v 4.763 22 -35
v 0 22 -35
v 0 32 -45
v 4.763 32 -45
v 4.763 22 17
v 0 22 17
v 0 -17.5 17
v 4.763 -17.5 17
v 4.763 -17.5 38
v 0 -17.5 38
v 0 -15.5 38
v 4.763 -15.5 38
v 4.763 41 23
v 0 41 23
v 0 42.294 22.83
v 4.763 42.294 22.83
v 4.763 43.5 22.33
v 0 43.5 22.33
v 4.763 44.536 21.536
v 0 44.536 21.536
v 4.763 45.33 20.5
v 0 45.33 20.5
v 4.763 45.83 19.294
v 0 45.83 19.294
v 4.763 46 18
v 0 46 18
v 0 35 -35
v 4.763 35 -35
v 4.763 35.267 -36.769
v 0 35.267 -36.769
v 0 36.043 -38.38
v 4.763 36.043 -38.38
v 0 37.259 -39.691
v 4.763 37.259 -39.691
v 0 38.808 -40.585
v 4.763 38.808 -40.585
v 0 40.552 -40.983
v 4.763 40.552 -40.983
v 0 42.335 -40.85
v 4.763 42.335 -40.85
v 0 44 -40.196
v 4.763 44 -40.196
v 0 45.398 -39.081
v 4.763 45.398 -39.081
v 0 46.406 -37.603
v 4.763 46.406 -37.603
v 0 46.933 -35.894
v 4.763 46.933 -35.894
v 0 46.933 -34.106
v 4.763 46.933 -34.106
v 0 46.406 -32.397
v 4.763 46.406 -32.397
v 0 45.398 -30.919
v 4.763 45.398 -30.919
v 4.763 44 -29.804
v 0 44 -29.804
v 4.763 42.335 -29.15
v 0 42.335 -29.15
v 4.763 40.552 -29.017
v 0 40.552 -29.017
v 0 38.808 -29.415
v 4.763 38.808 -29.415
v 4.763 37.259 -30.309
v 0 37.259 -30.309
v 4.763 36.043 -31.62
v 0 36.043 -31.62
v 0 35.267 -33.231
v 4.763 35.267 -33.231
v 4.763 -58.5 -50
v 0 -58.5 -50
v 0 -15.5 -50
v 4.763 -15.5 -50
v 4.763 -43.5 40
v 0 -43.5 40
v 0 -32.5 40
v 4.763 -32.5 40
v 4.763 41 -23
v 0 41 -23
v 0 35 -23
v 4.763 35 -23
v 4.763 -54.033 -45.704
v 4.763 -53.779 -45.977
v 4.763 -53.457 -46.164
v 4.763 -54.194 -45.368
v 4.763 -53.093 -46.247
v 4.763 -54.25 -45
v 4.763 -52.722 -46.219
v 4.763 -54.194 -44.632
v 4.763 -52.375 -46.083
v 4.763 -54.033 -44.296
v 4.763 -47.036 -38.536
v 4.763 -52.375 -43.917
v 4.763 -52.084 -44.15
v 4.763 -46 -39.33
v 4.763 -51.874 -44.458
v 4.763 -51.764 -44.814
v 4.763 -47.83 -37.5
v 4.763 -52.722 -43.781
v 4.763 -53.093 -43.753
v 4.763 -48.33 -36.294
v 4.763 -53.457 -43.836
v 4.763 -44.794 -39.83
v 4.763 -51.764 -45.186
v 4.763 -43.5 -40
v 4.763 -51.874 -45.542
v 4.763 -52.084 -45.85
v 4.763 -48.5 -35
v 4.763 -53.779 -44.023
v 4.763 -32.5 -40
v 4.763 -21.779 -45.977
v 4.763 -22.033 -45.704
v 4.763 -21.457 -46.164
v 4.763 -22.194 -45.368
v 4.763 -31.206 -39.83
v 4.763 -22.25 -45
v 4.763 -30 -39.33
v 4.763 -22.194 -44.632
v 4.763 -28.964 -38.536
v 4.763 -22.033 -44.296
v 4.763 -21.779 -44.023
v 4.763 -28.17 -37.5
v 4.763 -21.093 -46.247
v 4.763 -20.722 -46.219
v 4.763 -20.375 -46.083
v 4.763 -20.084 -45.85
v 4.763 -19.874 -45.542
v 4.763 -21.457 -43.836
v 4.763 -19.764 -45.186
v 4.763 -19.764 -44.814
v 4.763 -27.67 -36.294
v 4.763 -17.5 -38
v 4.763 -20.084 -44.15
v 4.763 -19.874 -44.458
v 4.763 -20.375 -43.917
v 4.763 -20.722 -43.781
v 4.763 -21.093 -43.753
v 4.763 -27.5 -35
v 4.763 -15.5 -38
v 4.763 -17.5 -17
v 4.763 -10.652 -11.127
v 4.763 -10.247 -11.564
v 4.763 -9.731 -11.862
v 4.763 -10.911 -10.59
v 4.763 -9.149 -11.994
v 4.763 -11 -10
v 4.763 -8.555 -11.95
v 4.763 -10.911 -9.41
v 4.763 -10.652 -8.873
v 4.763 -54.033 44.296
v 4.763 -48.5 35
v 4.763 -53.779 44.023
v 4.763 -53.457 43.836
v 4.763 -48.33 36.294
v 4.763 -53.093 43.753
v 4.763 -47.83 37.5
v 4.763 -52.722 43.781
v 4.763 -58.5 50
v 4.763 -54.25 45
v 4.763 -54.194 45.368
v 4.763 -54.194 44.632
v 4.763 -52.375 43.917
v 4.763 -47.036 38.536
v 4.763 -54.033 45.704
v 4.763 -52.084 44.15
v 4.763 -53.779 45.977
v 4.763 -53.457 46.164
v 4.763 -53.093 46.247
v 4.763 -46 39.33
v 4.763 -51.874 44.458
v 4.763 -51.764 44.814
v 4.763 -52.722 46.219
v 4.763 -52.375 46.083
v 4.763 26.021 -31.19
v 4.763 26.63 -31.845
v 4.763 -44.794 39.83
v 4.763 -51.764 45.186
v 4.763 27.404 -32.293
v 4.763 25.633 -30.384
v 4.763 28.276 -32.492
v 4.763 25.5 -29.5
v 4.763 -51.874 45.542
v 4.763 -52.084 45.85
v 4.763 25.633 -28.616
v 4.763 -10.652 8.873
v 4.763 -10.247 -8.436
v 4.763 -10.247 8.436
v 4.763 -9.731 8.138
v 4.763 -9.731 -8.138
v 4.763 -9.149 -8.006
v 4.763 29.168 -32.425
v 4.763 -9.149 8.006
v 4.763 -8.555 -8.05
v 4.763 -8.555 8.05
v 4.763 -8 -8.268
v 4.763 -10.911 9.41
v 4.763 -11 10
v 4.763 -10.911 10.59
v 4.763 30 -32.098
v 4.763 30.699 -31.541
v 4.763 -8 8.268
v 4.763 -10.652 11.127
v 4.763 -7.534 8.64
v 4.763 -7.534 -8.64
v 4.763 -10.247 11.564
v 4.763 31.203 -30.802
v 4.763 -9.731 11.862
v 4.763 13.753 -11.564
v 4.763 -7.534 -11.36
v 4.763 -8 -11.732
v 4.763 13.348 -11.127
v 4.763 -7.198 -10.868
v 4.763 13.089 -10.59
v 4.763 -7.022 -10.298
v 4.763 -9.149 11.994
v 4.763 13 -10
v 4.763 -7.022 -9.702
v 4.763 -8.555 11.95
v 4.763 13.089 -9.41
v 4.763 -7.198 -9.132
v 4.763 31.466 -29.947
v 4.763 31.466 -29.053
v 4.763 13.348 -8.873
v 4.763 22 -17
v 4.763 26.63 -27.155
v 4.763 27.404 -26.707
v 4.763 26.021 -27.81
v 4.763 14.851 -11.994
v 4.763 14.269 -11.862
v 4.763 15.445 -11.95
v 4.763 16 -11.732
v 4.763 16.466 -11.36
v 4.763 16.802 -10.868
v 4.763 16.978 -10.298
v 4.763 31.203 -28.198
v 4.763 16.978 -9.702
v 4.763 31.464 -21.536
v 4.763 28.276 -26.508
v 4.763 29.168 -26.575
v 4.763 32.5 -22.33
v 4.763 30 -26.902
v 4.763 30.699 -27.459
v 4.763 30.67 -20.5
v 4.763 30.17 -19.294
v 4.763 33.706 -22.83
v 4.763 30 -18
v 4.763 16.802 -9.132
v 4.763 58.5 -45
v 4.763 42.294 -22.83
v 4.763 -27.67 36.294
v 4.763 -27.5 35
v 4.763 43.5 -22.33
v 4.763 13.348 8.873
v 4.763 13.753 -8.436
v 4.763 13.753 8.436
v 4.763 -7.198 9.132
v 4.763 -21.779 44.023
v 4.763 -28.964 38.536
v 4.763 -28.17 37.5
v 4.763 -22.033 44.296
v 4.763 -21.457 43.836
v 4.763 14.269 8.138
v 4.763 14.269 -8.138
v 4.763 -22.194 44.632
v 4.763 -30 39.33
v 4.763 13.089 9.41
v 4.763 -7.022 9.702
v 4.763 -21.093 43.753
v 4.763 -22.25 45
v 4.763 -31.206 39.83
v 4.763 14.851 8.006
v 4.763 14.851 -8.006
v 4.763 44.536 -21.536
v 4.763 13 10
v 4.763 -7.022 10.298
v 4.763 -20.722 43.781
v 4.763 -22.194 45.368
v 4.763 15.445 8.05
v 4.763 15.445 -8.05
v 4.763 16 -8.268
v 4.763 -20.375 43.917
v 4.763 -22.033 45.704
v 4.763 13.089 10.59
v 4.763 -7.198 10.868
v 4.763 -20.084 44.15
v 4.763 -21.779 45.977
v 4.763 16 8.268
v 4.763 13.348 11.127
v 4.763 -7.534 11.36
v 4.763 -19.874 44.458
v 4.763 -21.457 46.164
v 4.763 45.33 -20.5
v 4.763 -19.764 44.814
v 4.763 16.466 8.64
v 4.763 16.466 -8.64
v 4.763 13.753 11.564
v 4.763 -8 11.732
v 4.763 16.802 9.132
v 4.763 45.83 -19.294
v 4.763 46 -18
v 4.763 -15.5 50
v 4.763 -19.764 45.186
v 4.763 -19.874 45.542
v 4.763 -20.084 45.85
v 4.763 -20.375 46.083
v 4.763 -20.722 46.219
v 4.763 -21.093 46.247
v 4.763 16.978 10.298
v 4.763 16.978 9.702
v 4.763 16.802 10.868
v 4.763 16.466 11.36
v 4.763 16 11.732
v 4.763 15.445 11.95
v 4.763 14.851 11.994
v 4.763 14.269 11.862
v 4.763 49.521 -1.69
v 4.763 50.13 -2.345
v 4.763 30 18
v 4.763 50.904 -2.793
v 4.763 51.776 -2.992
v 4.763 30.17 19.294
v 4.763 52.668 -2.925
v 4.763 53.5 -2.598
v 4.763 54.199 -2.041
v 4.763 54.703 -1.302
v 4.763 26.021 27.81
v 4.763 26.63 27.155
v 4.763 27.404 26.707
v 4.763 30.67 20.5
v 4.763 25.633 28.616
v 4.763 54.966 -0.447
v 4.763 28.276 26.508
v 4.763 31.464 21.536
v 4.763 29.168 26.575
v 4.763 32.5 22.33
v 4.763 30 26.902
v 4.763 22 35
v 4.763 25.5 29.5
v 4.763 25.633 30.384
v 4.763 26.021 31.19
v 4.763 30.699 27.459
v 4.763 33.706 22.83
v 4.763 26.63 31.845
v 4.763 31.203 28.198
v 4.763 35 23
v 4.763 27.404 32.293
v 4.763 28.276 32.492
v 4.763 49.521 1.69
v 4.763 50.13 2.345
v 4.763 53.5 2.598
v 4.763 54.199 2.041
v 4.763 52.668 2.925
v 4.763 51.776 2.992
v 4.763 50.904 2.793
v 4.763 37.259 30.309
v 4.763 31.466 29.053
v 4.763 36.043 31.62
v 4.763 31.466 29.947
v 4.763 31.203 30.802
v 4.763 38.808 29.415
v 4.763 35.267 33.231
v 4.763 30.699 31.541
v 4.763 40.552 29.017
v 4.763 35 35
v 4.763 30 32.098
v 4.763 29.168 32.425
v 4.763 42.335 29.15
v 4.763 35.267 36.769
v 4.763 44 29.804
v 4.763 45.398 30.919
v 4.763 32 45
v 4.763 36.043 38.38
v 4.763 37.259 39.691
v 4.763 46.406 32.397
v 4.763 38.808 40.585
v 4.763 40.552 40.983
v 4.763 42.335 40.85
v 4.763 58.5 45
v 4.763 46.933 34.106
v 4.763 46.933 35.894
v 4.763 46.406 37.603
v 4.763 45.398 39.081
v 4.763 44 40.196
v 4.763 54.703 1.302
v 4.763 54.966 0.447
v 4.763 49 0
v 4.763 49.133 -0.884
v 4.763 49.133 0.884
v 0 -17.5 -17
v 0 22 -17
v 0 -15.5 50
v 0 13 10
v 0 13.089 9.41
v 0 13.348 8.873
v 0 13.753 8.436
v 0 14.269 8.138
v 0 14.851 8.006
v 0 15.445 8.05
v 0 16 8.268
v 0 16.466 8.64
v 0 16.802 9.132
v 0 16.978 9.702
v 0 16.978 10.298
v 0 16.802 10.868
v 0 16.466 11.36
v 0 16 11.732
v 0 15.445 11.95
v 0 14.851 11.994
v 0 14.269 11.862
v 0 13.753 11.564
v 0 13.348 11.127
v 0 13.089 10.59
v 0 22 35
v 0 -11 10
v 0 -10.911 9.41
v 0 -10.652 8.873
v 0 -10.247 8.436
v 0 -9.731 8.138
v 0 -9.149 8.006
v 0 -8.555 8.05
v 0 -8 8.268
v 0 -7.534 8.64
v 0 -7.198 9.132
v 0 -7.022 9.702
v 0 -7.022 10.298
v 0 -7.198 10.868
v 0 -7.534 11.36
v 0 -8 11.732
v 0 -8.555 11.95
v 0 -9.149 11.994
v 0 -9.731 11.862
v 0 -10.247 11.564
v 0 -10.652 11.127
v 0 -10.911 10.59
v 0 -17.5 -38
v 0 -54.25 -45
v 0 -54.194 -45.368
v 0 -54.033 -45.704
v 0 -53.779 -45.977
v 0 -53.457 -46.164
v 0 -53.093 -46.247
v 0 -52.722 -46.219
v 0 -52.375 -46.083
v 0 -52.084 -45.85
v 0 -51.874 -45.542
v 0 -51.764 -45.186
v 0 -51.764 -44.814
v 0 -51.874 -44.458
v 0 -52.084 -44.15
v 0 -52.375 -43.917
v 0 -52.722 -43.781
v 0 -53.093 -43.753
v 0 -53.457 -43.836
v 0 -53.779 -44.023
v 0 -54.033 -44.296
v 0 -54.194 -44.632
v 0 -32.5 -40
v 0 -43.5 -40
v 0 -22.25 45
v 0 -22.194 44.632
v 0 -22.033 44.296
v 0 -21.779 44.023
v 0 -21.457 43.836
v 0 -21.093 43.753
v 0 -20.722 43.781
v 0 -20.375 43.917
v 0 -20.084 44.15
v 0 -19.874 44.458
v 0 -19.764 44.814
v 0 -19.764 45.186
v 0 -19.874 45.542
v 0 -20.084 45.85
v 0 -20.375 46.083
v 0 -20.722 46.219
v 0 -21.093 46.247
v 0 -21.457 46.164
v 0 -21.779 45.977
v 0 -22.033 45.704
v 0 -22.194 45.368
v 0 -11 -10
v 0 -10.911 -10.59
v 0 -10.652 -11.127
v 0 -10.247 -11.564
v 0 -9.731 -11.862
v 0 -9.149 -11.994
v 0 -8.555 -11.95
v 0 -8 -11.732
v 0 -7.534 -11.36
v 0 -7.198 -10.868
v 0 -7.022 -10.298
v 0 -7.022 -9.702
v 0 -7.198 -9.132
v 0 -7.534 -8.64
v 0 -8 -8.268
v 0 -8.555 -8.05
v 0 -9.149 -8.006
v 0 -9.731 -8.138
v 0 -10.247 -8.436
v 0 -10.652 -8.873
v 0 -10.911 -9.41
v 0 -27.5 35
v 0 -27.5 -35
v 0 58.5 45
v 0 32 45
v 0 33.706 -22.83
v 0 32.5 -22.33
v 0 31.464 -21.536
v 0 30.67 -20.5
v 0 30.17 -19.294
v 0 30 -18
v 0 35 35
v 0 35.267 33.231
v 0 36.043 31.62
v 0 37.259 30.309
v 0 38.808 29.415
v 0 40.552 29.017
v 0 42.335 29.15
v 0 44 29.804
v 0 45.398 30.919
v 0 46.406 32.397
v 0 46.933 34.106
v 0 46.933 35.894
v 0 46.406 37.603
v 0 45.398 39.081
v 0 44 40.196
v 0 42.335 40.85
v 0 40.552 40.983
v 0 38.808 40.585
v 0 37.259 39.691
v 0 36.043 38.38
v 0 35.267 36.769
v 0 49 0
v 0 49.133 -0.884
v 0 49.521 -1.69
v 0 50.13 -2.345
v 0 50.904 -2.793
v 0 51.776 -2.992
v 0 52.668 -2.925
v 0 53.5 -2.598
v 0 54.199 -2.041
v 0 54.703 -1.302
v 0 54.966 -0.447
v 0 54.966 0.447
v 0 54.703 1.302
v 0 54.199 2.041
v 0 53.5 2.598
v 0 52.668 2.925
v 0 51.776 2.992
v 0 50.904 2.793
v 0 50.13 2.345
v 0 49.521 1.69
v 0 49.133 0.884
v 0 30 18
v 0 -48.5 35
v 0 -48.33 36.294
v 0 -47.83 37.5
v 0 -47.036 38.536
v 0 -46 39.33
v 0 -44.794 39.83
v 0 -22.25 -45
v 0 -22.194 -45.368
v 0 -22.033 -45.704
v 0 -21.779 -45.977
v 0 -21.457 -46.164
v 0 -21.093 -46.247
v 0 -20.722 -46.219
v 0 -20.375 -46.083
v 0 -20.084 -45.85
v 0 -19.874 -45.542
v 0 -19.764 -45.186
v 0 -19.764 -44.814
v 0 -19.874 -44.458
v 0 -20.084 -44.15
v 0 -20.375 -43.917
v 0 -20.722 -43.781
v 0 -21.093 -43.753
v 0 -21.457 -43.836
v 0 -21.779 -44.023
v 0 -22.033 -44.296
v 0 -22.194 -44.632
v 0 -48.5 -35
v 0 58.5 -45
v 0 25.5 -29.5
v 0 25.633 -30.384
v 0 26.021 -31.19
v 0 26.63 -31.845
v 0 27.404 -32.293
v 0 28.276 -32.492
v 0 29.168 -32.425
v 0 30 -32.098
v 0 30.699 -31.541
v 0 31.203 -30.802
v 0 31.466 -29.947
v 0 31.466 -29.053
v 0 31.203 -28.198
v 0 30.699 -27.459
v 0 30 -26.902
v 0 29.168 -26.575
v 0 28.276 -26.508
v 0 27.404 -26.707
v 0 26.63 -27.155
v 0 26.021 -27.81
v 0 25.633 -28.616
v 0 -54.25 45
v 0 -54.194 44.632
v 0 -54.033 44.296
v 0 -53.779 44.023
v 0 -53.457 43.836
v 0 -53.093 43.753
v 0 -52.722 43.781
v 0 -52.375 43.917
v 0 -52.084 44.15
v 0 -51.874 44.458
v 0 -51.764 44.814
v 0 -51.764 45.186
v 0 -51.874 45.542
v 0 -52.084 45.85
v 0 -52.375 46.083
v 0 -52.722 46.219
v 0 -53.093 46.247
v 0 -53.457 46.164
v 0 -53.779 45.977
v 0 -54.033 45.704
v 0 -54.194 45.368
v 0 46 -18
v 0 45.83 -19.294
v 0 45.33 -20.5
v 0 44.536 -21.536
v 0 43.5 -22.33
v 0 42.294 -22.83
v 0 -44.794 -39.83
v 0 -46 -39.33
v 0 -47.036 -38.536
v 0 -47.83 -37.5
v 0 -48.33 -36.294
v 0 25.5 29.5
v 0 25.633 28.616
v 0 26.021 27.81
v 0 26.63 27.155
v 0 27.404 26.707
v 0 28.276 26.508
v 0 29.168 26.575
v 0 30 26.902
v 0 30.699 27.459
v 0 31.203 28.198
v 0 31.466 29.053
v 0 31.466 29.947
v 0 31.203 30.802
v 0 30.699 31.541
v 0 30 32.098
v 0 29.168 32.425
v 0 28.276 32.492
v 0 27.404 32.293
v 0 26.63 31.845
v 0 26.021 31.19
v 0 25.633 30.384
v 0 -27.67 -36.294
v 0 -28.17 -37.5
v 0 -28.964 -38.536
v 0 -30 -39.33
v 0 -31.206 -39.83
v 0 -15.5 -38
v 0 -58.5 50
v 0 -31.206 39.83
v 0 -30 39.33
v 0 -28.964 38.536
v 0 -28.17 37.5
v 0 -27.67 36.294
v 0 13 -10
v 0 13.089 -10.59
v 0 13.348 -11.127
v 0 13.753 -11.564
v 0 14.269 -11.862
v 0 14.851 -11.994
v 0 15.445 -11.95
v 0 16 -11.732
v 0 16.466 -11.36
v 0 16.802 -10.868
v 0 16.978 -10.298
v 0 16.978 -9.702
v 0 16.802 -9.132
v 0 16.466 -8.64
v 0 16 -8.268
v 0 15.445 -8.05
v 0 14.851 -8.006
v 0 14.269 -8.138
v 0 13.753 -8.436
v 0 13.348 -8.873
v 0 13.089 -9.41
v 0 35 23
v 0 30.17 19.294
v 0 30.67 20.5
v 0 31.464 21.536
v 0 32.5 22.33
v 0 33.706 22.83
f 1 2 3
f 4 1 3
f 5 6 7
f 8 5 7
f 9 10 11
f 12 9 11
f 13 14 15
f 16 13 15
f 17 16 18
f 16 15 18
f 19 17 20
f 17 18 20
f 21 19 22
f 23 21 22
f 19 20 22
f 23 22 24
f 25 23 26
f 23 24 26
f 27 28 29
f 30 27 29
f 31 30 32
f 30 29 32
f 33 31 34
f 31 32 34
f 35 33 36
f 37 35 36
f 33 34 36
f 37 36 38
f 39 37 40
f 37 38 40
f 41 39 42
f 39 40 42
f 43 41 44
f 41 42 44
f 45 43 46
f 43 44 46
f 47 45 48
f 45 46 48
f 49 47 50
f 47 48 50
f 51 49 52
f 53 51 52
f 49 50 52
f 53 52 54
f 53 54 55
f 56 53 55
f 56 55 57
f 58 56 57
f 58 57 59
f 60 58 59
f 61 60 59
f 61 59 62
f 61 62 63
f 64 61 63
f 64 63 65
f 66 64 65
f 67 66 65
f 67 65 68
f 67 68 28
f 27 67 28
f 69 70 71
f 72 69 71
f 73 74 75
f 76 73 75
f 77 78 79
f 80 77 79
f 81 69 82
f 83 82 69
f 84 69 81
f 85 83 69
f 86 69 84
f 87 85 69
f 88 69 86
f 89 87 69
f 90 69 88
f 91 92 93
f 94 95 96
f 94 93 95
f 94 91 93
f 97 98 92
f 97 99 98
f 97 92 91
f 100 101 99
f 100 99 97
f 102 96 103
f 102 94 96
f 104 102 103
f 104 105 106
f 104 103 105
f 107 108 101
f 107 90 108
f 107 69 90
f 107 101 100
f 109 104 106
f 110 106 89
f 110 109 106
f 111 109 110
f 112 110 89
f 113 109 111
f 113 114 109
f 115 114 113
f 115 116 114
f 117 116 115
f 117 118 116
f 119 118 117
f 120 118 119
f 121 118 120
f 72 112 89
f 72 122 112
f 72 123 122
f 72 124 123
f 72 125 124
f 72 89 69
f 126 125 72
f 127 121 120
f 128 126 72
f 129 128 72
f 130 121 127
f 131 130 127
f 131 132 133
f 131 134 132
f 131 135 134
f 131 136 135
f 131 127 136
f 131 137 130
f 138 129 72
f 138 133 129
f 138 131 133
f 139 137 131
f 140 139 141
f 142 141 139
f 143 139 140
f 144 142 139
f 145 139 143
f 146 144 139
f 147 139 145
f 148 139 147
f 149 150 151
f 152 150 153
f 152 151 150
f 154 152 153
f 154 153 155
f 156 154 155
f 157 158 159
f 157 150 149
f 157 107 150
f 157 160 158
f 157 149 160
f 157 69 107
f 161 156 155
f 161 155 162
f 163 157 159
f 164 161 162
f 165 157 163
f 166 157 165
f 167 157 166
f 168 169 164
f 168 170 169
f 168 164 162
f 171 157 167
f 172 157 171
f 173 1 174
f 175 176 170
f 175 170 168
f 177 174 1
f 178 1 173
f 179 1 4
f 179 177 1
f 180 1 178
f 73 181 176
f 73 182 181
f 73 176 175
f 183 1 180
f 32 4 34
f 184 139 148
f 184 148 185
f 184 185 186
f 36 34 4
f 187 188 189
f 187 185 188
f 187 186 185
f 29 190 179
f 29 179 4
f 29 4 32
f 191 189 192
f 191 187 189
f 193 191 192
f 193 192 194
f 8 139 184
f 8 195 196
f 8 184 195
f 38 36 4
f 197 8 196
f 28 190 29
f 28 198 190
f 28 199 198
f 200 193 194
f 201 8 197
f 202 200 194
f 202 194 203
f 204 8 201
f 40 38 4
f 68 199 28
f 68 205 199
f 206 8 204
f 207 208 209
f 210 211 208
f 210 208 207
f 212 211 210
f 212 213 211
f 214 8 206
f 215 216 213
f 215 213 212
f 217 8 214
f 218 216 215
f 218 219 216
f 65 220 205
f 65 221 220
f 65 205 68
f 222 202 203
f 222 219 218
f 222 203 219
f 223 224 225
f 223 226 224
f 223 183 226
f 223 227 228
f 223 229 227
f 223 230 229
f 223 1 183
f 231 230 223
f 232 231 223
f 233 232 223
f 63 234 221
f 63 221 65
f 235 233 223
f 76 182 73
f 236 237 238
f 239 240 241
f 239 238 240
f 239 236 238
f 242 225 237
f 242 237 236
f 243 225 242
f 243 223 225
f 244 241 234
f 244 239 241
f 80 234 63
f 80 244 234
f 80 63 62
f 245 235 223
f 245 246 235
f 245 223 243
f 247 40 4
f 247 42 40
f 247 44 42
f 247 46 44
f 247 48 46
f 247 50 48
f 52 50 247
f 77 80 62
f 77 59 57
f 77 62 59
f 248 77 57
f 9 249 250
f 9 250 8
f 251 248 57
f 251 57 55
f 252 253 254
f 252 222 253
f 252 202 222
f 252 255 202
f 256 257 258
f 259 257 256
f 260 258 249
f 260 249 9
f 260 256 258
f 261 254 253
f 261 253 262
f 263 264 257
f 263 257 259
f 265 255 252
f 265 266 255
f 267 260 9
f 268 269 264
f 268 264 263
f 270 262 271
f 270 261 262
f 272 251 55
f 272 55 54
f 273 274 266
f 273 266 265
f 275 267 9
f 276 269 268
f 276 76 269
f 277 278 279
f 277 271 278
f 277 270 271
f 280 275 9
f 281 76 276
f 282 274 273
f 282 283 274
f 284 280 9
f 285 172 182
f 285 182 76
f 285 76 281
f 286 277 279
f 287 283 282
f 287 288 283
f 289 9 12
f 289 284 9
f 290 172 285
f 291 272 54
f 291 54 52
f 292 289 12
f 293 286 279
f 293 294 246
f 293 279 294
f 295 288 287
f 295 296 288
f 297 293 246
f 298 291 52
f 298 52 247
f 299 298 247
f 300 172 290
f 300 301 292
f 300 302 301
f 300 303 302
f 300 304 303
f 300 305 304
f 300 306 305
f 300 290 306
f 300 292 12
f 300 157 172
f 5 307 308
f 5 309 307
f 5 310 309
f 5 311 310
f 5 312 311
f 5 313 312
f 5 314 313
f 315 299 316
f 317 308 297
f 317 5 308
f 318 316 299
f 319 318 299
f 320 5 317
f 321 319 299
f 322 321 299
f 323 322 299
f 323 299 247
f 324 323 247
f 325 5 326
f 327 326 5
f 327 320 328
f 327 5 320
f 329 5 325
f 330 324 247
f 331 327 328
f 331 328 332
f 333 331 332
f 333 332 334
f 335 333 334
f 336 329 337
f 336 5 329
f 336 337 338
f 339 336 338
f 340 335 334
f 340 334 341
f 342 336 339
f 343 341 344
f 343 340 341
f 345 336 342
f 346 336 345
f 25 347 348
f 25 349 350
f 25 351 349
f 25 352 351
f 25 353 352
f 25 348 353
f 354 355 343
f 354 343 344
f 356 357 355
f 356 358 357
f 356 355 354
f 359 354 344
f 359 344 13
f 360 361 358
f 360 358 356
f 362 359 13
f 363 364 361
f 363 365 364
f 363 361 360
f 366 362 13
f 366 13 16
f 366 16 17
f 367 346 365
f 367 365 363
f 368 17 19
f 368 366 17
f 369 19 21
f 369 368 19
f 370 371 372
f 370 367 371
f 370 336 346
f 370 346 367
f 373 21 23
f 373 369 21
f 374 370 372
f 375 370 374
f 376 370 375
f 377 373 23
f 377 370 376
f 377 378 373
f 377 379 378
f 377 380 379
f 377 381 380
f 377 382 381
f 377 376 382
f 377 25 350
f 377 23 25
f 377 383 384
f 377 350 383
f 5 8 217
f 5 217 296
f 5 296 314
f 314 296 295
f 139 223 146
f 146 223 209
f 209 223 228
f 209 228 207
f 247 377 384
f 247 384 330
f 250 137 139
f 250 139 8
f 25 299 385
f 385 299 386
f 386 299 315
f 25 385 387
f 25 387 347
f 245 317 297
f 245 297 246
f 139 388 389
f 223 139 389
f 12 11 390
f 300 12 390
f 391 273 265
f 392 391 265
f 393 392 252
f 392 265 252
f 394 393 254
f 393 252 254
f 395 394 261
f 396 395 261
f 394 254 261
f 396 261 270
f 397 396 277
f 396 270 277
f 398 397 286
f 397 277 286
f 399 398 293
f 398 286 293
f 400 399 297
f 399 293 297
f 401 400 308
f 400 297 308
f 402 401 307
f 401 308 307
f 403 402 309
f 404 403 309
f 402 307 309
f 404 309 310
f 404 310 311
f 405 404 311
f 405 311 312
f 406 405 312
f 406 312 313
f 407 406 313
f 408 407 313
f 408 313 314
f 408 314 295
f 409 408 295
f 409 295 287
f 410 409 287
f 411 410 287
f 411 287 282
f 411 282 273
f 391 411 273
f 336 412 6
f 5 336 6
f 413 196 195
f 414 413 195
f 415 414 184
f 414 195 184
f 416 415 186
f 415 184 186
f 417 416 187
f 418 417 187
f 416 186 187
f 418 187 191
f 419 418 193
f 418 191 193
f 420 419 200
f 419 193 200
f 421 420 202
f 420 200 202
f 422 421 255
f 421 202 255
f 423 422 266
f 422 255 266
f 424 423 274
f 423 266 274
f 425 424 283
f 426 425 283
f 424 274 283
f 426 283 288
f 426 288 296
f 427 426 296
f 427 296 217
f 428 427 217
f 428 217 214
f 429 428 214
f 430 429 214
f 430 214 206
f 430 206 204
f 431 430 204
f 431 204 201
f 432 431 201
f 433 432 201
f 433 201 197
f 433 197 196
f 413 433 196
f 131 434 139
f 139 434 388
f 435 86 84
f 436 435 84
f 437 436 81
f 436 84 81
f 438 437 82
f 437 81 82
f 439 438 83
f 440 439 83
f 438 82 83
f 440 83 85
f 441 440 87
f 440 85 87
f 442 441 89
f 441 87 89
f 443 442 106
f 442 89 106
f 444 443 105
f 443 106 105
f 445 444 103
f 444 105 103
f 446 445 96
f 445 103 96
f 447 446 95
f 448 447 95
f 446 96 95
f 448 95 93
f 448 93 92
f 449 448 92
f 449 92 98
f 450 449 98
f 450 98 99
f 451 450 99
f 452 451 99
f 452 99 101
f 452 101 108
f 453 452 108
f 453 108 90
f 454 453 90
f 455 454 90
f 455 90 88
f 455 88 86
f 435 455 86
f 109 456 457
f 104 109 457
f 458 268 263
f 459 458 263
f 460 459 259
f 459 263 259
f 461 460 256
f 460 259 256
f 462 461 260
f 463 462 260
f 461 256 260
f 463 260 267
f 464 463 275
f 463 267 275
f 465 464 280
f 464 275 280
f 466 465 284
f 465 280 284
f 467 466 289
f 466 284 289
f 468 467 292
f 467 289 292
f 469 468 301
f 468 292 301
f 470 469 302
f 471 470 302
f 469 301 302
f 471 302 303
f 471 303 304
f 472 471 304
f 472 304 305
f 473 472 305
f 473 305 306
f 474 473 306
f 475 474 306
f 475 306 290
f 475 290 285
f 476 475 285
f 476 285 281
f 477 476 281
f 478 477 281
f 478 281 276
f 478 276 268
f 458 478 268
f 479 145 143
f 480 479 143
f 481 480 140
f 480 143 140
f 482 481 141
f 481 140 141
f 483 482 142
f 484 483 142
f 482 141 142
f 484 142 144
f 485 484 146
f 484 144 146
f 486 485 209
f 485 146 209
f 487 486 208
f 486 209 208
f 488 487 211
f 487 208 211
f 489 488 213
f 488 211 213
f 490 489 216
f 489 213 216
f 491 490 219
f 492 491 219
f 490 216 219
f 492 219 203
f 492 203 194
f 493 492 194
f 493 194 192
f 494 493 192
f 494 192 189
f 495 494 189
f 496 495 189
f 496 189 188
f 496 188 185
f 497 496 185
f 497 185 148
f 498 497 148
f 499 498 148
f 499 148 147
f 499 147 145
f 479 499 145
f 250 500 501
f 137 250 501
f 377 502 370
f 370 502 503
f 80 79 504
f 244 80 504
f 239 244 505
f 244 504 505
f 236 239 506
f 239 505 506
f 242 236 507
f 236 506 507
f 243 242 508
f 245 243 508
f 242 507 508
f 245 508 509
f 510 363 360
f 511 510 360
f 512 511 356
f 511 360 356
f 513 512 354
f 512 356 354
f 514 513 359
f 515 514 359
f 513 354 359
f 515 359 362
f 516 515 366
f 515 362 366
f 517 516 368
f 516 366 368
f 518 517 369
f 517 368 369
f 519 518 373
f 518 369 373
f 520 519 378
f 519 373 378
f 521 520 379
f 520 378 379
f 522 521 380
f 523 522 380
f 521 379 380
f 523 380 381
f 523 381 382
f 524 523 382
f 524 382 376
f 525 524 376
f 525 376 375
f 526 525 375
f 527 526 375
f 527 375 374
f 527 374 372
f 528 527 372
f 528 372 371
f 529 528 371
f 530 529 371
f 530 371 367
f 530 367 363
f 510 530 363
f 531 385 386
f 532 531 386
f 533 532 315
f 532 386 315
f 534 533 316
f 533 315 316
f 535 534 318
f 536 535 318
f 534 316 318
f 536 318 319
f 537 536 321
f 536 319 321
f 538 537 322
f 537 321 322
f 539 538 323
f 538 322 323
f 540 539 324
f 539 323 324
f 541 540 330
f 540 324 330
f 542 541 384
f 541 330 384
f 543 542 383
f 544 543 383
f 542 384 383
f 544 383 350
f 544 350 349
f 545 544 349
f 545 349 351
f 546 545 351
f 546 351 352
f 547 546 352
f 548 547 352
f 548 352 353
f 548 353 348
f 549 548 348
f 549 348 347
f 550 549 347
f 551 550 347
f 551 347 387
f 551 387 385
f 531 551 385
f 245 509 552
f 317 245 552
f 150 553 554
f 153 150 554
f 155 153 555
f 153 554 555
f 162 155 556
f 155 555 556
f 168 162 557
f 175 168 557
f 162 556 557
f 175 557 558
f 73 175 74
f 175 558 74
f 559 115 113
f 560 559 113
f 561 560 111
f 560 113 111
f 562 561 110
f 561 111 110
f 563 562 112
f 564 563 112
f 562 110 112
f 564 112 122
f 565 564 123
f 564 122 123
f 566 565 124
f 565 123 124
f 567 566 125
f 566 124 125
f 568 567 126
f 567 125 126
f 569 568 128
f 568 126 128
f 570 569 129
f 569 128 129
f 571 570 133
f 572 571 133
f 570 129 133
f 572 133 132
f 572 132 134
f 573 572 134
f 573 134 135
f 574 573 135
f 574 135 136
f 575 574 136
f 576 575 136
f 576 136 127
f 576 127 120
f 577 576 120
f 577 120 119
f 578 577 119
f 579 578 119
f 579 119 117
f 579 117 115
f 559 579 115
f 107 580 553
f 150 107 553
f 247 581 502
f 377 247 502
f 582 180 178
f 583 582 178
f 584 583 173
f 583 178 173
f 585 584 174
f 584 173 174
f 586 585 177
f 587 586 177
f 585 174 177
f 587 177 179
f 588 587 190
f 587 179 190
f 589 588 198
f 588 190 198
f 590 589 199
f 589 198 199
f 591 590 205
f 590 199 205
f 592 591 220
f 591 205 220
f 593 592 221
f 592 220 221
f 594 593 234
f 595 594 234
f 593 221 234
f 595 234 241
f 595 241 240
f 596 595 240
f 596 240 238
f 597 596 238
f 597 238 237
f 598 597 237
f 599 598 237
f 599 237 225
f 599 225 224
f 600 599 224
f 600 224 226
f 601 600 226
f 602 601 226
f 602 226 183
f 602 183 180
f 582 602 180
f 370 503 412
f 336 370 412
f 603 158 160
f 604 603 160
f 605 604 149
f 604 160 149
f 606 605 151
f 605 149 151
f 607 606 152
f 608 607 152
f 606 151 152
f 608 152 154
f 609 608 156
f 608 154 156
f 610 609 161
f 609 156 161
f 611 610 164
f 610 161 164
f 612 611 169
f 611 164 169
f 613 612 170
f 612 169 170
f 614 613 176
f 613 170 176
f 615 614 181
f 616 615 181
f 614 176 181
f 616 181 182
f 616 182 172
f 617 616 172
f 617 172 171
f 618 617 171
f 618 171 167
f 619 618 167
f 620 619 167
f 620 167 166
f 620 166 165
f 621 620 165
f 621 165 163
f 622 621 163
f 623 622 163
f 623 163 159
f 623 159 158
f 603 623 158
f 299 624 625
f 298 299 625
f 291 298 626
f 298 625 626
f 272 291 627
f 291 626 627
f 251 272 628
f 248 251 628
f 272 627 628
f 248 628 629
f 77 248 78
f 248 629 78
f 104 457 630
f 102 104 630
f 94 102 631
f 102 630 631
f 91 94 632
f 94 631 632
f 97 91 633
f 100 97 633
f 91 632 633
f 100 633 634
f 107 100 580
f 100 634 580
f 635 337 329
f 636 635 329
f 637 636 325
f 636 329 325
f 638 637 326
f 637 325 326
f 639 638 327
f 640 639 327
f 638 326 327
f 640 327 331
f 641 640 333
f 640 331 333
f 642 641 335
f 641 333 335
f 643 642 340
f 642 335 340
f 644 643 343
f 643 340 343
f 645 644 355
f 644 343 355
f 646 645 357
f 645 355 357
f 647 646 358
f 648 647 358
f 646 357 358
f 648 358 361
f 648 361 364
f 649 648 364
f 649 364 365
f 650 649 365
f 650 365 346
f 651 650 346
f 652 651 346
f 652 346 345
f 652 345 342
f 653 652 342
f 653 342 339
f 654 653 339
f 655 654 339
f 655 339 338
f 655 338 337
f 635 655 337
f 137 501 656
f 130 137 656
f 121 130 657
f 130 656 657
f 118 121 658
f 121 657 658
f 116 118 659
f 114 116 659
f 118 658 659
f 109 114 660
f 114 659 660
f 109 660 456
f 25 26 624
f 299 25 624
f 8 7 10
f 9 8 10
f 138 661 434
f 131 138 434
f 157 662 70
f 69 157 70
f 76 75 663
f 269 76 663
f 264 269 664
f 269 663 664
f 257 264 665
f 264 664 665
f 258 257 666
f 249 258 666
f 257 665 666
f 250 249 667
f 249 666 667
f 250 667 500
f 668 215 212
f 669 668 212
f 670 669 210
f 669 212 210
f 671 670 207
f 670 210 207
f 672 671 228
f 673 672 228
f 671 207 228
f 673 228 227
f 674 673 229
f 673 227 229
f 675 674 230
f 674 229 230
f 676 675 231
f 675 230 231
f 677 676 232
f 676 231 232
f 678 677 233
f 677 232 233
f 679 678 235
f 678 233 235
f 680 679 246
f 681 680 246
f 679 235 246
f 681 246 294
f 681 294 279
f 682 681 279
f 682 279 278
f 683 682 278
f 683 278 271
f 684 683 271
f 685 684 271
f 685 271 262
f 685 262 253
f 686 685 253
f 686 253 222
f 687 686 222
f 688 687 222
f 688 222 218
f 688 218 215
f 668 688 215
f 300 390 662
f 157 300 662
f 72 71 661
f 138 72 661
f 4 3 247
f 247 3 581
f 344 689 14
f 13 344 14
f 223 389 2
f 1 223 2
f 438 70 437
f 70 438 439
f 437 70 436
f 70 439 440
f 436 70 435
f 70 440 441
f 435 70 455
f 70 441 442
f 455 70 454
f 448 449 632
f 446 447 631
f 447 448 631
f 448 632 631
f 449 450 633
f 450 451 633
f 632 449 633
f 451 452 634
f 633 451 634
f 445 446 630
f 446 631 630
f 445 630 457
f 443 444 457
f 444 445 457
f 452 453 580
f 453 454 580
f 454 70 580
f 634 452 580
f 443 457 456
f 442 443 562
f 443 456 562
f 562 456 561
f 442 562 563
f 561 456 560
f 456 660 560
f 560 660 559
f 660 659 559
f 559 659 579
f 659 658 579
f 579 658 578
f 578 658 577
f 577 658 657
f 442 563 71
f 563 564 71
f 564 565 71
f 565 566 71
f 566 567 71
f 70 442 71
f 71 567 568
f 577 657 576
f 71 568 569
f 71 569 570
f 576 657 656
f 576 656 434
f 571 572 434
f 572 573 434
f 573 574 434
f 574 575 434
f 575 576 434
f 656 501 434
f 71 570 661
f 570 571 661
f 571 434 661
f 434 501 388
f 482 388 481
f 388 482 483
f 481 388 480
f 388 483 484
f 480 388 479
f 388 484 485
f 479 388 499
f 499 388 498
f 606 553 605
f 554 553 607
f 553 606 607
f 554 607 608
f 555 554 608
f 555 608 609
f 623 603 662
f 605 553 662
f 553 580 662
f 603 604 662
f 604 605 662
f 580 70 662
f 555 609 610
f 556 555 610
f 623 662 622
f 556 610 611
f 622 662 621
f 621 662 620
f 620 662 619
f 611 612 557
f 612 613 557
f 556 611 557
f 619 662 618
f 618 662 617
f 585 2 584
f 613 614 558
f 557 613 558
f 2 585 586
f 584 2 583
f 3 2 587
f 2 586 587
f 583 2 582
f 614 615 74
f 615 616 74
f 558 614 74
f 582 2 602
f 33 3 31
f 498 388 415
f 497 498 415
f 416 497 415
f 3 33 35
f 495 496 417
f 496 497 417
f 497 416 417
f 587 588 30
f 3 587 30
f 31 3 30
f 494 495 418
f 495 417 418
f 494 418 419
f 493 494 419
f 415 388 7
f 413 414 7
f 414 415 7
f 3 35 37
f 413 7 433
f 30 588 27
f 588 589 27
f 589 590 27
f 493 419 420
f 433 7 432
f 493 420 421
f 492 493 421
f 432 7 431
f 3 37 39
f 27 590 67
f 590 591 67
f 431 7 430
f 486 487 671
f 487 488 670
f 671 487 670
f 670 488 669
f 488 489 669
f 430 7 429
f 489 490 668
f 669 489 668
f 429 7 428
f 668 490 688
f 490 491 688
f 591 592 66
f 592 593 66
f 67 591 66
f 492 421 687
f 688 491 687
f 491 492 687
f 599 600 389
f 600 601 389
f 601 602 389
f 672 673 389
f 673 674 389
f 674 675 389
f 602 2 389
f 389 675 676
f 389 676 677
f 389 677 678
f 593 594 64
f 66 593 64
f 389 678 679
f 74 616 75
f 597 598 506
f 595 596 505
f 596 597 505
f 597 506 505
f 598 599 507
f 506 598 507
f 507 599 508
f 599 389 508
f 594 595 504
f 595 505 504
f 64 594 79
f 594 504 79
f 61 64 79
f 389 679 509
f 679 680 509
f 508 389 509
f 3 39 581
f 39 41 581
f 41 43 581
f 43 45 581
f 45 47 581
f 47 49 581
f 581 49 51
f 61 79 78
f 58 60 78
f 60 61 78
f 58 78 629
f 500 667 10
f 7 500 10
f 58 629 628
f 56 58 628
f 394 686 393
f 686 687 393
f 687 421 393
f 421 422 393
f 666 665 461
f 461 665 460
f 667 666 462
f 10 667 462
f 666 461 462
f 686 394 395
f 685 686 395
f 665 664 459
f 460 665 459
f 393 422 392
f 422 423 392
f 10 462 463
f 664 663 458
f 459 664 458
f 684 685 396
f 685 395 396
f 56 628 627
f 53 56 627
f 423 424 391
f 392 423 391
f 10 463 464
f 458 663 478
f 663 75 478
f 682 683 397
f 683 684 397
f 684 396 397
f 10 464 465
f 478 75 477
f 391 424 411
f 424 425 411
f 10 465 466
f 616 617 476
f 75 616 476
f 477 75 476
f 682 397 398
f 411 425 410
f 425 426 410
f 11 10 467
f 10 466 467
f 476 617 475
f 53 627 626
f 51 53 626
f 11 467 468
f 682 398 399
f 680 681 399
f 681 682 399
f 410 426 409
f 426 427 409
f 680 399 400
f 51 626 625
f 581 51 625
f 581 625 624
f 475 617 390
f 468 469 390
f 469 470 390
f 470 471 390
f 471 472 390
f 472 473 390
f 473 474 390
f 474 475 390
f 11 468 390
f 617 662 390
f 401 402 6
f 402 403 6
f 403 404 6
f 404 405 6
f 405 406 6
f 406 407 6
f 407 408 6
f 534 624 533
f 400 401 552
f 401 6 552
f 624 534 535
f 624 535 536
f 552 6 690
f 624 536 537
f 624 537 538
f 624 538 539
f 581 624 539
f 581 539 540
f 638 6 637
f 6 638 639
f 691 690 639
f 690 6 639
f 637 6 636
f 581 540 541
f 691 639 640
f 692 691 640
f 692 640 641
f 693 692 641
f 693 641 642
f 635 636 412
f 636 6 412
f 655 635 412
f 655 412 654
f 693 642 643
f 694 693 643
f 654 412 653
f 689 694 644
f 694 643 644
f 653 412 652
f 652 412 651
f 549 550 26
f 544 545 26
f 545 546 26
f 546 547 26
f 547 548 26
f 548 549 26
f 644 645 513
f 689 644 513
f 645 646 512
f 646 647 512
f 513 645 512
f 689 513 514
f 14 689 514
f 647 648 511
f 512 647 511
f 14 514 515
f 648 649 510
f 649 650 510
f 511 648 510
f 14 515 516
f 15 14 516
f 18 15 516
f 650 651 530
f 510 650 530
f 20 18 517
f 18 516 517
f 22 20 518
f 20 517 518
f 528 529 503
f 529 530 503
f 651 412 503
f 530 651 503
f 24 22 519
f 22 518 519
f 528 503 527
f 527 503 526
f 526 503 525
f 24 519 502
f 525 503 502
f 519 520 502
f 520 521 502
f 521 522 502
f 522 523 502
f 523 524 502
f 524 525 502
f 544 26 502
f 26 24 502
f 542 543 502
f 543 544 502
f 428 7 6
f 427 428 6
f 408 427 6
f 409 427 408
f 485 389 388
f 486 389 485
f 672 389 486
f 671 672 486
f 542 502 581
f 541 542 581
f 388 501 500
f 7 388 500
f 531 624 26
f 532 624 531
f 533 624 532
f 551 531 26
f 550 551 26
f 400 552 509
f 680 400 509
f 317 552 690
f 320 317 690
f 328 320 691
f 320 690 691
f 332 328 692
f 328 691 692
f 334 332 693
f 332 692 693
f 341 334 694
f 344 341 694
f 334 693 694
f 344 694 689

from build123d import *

# Parameters (mm, degrees)
F1_DEPTH = 4.763
F2_D     = 2.5
F3_D     = 4
F4_D     = 6
F5_D     = 12


with BuildPart() as f1:
    # F0 (on Right) → F1 (new body)
    with BuildSketch(Plane.YZ):
        Polygon((30, 17), (22, 17), (-17.5, 17), (-27.5, 17), (-27.5, 0), (-27.5, -17), (-17.5, -17), (22, -17), (30, -17), (30, 0), align=None)
        with BuildLine():
            Line((22, 35), (22, 17))
            Line((22, 17), (30, 17))
            Line((30, 17), (30, 18))
            ThreePointArc((30, 18), (31.4644660941, 21.5355339059), (35, 23))
            Line((35, 23), (41, 23))
            ThreePointArc((41, 23), (44.5355339059, 21.5355339059), (46, 18))
            Line((46, 18), (46, 17))
            Line((46, 17), (58.5, 17))
            Line((58.5, 17), (58.5, 45))
            Line((58.5, 45), (32, 45))
            Line((32, 45), (22, 35))
        make_face()
        with BuildLine():
            Line((-27.5, 17), (-17.5, 17))
            Line((-17.5, 17), (-17.5, 38))
            Line((-17.5, 38), (-15.5, 38))
            Line((-15.5, 38), (-15.5, 50))
            Line((-15.5, 50), (-21, 50))
            Line((-21, 50), (-53, 50))
            Line((-53, 50), (-58.5, 50))
            Line((-58.5, 50), (-58.5, 38))
            Line((-58.5, 38), (-58.5, 17))
            Line((-58.5, 17), (-48.5, 17))
            Line((-48.5, 17), (-48.5, 35))
            ThreePointArc((-48.5, 35), (-47.0355339059, 38.5355339059), (-43.5, 40))
            Line((-43.5, 40), (-32.5, 40))
            ThreePointArc((-32.5, 40), (-28.9644660941, 38.5355339059), (-27.5, 35))
            Line((-27.5, 35), (-27.5, 17))
        make_face()
        Polygon((58.5, 17), (46, 17), (46, 0), (46, -17), (58.5, -17), align=None)
        Polygon((-48.5, 0), (-48.5, 17), (-58.5, 17), (-58.5, -17), (-48.5, -17), align=None)
        with BuildLine():
            Line((30, -18), (30, -17))
            Line((30, -17), (22, -17))
            Line((22, -17), (22, -35))
            Line((22, -35), (32, -45))
            Line((32, -45), (58.5, -45))
            Line((58.5, -45), (58.5, -17))
            Line((58.5, -17), (46, -17))
            Line((46, -17), (46, -18))
            ThreePointArc((46, -18), (44.5355339059, -21.5355339059), (41, -23))
            Line((41, -23), (35, -23))
            ThreePointArc((35, -23), (31.4644660941, -21.5355339059), (30, -18))
        make_face()
        with BuildLine():
            Line((-17.5, -17), (-27.5, -17))
            Line((-27.5, -17), (-27.5, -35))
            ThreePointArc((-27.5, -35), (-28.9644660941, -38.5355339059), (-32.5, -40))
            Line((-32.5, -40), (-43.5, -40))
            ThreePointArc((-43.5, -40), (-47.0355339059, -38.5355339059), (-48.5, -35))
            Line((-48.5, -35), (-48.5, -17))
            Line((-48.5, -17), (-58.5, -17))
            Line((-58.5, -17), (-58.5, -38))
            Line((-58.5, -38), (-58.5, -50))
            Line((-58.5, -50), (-53, -50))
            Line((-53, -50), (-21, -50))
            Line((-21, -50), (-15.5, -50))
            Line((-15.5, -50), (-15.5, -38))
            Line((-15.5, -38), (-17.5, -38))
            Line((-17.5, -38), (-17.5, -17))
        make_face()
    extrude(amount=F1_DEPTH)

    # F2 (through all)
    with Locations(Plane(origin=(0, 0, 0), x_dir=(0, 1, 0), z_dir=(-1, 0, 0))):
        with Locations((-53, -45), (-21, -45), (-21, 45), (-53, 45)):
            Hole(F2_D / 2)

    # F3 (through all)
    with Locations(Plane(origin=(0, 0, 0), x_dir=(0, 1, 0), z_dir=(-1, 0, 0))):
        with Locations((-9, -10), (15, -10), (15, 10), (-9, 10)):
            Hole(F3_D / 2)

    # F4 (through all)
    with Locations(Plane(origin=(0, 0, 0), x_dir=(0, 1, 0), z_dir=(-1, 0, 0))):
        with Locations((52, 0), (28.5, 29.5), (28.5, -29.5)):
            Hole(F4_D / 2)

    # F5 (through all)
    with Locations(Plane(origin=(0, 0, 0), x_dir=(0, 1, 0), z_dir=(-1, 0, 0))):
        with Locations((41, -35), (41, 35)):
            Hole(F5_D / 2)


solid = f1.part
